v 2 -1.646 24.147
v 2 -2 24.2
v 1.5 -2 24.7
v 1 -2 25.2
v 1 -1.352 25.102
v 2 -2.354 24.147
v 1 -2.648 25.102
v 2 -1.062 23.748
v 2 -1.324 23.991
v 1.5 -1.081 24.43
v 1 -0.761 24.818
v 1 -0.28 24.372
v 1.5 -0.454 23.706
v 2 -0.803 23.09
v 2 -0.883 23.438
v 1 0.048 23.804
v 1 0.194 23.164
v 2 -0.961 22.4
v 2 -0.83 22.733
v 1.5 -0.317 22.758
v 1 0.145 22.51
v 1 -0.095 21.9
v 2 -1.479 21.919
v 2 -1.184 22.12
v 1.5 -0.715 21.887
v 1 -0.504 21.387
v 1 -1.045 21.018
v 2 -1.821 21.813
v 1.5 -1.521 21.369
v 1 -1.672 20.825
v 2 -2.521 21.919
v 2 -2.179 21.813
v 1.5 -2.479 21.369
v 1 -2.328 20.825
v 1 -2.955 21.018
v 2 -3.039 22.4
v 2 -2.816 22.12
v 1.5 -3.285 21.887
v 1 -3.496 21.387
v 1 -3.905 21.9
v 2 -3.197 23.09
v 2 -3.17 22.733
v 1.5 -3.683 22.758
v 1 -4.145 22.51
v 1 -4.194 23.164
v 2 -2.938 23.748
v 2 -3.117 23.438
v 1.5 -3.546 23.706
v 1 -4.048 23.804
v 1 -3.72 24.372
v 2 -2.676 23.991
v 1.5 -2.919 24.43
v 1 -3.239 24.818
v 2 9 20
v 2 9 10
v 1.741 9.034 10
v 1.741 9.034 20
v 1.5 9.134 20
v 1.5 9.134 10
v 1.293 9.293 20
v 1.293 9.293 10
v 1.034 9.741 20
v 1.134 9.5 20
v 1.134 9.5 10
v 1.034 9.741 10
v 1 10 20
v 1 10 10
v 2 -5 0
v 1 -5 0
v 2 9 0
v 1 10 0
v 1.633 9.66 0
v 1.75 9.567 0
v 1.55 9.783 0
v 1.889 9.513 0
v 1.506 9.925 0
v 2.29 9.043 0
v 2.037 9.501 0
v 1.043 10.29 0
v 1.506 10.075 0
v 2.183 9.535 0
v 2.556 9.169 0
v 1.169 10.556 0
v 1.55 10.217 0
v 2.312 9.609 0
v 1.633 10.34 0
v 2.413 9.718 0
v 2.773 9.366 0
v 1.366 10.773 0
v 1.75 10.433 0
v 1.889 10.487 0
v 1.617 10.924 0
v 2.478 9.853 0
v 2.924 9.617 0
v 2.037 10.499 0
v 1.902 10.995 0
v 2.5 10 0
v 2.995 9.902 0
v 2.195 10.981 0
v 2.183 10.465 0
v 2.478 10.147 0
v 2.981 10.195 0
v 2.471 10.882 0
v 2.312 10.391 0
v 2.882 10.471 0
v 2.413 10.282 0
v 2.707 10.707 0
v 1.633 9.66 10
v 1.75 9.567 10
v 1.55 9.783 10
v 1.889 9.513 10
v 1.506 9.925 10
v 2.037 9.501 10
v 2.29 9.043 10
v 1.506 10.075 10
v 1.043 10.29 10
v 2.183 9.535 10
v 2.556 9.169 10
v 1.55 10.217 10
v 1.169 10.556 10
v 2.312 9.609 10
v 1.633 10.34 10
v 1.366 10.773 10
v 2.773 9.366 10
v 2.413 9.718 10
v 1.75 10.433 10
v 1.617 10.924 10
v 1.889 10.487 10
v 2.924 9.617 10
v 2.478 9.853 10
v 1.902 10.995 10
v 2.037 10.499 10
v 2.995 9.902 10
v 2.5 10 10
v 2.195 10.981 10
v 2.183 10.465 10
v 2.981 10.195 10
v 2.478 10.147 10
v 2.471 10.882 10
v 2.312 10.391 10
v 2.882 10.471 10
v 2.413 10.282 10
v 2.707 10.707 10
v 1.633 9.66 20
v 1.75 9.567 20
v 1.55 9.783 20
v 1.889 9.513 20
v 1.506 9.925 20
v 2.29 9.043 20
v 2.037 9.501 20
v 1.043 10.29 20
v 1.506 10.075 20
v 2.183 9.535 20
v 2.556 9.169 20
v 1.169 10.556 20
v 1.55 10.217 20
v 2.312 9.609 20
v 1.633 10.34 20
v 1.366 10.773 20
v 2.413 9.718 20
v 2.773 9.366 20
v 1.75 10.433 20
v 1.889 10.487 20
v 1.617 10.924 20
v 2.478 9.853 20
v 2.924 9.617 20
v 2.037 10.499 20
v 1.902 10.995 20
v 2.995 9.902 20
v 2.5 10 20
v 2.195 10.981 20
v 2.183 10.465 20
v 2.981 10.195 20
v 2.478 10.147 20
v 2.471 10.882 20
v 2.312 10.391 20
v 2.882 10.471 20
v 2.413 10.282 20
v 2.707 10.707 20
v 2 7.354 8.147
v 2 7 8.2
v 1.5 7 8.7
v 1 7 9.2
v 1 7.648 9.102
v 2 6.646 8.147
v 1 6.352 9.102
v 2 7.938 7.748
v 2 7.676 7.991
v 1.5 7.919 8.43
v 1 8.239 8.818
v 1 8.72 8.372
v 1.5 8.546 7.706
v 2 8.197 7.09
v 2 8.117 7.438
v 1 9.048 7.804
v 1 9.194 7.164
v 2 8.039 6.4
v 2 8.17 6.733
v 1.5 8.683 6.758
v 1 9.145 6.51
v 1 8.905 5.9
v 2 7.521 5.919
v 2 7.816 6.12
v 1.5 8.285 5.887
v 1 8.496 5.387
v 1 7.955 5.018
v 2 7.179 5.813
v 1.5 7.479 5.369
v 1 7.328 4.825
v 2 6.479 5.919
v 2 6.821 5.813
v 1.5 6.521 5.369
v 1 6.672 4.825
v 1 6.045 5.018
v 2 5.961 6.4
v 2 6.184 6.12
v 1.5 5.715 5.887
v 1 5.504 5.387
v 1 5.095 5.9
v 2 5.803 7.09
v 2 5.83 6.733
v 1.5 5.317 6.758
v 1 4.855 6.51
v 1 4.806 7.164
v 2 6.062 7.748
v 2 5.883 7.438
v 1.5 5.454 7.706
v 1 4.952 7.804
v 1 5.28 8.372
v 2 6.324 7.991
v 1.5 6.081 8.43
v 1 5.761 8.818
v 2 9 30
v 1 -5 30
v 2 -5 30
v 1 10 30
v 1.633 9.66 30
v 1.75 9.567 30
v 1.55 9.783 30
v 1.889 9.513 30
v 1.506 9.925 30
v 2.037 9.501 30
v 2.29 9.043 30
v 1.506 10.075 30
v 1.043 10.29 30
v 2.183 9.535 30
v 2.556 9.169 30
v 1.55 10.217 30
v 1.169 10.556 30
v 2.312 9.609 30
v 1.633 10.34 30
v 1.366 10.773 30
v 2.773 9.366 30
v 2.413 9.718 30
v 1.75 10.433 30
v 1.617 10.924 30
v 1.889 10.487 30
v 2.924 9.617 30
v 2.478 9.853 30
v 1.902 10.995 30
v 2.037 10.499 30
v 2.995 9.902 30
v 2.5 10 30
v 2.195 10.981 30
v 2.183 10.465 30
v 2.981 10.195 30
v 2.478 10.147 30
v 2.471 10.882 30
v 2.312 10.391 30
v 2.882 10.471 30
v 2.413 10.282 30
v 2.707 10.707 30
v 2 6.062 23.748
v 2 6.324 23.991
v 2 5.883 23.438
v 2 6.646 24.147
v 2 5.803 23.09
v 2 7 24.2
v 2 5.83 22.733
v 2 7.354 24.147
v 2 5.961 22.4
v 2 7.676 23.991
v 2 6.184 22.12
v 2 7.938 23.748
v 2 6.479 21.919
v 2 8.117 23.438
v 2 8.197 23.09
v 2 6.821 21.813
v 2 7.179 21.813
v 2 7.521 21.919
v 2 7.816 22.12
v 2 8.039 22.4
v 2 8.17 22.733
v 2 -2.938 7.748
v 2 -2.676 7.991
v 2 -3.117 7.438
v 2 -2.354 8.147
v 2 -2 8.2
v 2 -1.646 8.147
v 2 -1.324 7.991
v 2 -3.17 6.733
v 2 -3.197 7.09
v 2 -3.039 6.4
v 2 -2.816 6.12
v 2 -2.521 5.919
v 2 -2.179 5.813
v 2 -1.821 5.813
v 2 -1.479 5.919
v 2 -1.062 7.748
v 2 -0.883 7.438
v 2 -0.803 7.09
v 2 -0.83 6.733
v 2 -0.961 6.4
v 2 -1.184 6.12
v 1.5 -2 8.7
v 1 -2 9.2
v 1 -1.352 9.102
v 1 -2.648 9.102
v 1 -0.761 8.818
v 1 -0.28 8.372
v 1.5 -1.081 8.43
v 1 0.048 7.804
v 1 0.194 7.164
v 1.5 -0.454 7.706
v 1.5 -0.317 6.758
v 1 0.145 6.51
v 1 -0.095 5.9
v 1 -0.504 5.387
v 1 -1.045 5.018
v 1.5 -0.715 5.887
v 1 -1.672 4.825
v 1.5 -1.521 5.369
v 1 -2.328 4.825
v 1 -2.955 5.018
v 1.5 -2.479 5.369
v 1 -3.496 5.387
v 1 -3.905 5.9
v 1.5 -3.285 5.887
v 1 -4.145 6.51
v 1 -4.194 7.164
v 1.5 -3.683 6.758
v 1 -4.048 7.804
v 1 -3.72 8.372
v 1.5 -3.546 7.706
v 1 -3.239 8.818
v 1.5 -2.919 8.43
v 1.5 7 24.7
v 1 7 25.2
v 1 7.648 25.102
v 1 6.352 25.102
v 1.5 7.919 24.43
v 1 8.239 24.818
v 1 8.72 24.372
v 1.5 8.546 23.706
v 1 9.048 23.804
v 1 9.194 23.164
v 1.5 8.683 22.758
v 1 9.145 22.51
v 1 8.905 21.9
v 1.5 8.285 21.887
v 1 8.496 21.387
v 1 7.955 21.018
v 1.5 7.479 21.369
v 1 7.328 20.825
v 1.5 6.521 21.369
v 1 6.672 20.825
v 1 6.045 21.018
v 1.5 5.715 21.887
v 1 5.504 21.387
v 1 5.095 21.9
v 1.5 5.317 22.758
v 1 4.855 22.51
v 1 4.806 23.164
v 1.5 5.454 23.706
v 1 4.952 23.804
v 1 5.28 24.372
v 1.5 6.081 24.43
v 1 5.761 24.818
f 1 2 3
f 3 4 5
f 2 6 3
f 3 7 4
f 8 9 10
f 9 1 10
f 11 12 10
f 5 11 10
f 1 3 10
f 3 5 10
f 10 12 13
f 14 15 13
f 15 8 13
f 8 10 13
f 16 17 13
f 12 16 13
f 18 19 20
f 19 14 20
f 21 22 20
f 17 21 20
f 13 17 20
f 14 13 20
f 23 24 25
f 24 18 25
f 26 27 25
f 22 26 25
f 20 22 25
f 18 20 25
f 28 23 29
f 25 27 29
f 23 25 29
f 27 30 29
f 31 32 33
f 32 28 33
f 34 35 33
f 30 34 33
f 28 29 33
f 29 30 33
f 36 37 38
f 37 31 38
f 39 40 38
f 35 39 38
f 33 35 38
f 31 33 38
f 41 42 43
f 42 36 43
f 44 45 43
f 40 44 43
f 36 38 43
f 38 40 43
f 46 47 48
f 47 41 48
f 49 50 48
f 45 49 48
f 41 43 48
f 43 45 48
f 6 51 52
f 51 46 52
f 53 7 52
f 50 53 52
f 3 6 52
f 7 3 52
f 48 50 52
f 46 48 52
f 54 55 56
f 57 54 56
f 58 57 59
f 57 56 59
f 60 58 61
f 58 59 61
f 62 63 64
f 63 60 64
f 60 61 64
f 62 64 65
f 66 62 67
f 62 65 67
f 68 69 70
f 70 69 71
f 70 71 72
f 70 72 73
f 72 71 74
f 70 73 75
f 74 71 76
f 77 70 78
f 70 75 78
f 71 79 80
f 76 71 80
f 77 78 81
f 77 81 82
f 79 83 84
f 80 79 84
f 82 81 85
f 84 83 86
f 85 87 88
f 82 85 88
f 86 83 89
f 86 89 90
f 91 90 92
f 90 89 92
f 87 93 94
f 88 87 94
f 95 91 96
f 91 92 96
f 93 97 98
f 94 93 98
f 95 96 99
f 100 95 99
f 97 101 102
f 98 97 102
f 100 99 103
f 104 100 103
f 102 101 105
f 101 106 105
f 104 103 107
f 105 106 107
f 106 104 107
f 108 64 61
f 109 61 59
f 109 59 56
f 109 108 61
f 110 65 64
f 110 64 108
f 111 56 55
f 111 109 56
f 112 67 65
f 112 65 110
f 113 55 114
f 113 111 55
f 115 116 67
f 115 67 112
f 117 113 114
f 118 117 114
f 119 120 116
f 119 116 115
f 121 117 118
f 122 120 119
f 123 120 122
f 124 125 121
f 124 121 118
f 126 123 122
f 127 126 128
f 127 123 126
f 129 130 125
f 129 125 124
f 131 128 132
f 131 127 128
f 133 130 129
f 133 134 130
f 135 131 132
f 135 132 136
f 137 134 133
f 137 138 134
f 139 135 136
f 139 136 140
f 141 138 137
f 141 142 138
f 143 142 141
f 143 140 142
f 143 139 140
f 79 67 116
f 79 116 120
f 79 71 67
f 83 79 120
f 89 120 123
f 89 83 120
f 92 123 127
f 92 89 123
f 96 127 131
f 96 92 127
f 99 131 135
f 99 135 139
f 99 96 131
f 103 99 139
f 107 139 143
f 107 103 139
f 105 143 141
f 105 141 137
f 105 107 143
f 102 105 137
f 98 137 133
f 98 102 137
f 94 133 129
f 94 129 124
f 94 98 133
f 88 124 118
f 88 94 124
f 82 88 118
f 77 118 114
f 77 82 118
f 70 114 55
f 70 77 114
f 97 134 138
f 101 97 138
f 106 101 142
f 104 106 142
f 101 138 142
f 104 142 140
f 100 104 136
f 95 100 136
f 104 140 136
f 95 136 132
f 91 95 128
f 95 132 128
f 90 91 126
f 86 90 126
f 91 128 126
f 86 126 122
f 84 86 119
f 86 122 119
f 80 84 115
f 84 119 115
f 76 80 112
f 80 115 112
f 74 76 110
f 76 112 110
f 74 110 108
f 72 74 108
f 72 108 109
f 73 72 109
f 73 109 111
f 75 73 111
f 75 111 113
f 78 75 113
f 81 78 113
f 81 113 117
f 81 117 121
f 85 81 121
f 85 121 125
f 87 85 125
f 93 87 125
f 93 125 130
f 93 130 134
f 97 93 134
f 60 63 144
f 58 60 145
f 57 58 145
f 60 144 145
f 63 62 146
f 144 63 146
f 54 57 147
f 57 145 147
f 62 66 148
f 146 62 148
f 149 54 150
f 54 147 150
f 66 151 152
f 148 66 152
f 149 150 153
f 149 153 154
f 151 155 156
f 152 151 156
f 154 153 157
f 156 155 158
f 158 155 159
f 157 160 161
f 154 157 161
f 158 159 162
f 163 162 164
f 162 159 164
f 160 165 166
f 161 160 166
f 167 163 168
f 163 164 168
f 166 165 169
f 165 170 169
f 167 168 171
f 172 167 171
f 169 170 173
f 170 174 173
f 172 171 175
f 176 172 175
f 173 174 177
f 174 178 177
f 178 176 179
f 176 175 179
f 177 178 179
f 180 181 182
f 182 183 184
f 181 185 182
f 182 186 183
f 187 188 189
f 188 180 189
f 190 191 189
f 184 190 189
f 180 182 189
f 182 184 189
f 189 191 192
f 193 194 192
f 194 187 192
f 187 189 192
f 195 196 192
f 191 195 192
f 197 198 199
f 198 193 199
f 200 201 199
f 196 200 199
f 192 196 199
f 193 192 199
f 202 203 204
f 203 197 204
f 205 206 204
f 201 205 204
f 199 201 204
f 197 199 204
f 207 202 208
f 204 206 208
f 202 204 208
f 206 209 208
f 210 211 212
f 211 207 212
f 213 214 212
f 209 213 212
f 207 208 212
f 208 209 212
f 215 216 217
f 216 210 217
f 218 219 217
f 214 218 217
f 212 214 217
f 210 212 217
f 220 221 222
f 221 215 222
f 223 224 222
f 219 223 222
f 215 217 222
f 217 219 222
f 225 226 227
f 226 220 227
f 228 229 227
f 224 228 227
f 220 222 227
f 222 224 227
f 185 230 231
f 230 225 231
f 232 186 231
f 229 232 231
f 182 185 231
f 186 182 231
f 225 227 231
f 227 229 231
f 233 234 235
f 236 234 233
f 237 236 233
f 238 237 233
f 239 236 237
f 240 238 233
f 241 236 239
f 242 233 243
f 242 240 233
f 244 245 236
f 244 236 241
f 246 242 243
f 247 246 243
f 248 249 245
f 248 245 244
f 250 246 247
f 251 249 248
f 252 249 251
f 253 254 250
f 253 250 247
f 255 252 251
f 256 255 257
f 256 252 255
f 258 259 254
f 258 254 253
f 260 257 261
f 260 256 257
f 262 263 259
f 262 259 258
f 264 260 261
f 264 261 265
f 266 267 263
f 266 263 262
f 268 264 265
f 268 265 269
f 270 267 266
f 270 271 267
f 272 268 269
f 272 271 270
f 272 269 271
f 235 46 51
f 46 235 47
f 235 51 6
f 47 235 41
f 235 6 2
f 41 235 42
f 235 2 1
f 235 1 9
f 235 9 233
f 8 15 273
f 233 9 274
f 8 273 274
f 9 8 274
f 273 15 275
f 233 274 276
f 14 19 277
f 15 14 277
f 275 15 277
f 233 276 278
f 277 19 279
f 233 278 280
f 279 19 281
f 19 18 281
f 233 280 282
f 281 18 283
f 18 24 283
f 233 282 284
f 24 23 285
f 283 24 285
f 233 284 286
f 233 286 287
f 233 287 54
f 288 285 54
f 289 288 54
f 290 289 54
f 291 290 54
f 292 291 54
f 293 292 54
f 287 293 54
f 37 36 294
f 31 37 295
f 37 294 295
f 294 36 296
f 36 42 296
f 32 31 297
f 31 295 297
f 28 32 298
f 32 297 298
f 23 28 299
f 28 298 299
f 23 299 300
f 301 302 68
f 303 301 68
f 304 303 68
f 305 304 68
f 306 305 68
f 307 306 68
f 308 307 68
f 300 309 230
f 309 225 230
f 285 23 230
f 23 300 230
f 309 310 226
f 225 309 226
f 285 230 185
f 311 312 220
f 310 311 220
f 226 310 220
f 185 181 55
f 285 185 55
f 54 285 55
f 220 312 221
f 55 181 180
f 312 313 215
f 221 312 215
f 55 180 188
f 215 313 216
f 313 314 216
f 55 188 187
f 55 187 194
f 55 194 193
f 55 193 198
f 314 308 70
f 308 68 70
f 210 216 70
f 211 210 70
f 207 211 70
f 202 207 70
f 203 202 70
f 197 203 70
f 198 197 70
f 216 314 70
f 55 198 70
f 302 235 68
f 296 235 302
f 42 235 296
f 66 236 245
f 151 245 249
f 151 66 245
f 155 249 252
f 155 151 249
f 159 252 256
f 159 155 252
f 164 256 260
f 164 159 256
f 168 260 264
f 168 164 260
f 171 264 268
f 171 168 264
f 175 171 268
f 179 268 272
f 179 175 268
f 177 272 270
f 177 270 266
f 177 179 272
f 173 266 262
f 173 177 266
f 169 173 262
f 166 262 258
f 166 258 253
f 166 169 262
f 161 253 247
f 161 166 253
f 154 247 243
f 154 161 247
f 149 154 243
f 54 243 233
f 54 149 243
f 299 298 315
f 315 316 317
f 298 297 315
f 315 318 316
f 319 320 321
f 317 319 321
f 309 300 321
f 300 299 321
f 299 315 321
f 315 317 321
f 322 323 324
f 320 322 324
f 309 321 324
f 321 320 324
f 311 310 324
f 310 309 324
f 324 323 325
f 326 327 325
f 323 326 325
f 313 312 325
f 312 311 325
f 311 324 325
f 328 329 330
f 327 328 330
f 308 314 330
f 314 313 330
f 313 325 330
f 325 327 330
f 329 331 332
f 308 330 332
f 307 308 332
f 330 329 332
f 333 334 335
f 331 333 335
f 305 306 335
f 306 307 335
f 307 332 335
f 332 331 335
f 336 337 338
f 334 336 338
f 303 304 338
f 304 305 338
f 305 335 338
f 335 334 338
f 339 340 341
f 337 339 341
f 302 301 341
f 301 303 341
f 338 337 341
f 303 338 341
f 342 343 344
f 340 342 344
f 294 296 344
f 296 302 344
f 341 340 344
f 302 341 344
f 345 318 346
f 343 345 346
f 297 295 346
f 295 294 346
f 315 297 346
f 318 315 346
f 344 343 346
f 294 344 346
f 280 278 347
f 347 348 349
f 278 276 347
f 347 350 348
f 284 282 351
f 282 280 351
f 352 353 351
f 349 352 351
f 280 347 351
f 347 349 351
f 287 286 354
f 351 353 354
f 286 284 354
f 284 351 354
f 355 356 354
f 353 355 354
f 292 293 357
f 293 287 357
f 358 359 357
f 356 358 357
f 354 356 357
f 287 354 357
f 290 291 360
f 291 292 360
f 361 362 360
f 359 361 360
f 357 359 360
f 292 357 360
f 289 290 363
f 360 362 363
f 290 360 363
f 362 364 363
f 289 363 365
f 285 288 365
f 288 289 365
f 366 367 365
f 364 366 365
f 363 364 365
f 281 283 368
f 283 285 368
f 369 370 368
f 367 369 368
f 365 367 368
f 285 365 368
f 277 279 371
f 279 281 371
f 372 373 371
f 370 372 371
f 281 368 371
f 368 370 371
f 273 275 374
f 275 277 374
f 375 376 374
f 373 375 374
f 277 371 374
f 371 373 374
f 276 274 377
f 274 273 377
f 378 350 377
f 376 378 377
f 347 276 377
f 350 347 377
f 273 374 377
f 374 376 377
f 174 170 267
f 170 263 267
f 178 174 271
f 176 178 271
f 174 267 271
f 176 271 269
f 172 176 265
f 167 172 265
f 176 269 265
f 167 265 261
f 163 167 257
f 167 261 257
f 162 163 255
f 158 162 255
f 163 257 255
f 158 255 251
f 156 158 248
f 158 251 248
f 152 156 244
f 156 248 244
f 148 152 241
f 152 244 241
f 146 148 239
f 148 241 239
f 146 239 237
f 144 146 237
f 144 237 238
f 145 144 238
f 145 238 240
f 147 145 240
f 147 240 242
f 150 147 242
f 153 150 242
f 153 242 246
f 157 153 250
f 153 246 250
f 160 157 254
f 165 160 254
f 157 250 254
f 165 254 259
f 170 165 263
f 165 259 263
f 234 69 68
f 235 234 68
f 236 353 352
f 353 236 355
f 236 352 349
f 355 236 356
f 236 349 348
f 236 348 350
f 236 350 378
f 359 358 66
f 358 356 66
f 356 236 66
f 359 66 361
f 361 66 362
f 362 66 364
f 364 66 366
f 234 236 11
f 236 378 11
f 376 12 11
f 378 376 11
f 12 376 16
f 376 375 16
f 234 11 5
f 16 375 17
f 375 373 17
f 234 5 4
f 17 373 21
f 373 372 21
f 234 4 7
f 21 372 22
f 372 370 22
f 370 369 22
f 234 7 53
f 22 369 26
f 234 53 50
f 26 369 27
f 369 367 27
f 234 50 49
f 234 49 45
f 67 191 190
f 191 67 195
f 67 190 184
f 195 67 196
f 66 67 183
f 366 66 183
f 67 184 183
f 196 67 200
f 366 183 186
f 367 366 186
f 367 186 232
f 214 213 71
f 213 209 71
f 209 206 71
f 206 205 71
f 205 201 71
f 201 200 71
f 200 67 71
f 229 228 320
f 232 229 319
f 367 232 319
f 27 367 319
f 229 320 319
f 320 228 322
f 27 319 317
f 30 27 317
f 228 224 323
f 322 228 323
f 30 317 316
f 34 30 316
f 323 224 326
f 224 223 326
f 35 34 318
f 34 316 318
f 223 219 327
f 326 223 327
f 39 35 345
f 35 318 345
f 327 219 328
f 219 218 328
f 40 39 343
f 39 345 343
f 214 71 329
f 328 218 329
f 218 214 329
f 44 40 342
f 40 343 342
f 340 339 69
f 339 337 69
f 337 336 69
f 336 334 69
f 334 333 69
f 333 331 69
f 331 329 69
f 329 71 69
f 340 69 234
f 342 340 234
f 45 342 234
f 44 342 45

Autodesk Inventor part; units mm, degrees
ref_plane "YZ Plane" through (0, 0, 0) normal (1, 0, 0) x (0, 1, 0)
ref_plane "XZ Plane" through (0, 0, 0) normal (0, 1, 0) x (-1, 0, 0)
ref_plane "XY Plane" through (0, 0, 0) normal (0, 0, 1) x (1, 0, 0)
sketch "Szkic1" plane through (0, 0, 0) normal (0, 0, 1) x (1, 0, 0)
  line L0 (2, 10) -> (1, 10)
  line L1 (1, 10) -> (1, -5)
  line L2 (1, -5) -> (2, -5)
  line L3 (2, -5) -> (2, 10)
  circle A0 centre (2, 10) radius 1
  point P0 (0, 0)
  point P1 (0, 0)
  point P2 (2, 9)
  point P3 (2, 9)
extrude "Wyciągnięcie proste1" add sketch "Szkic1" along normal blind 30
ref_plane "Płaszczyzna konstrukcyjna1" through (0, 0, 10) normal (0, 0, 1) x (1, 0, 0)
sketch "Szkic2" plane through (0, 0, 10) normal (0, 0, 1) x (1, 0, 0)
  arc A0 (2, 9) -> (1, 10) centre (2, 10) ccw projected
  circle A1 centre (2, 10) radius 1
  point P0 (0, 0)
extrude "Wyciągnięcie proste2" cut sketch "Szkic2" along normal blind 10
sketch "Szkic3" plane through (0, 0, 30) normal (0, 0, 1) x (1, 0, 0)
  circle A0 centre (2, 10) radius 0.5
  point P0 (0, 0)
  dimension "d5" = 1
extrude "Wyciągnięcie proste3" cut sketch "Szkic3" against normal blind 30
sketch "Szkic8" plane through (1, -5, 0) normal (-1, 0, 0) x (0, 0, 1)
  point P0 (7, 3)
hole "Otwór5" at (1, -2, 7) direction (1, 0, 0) diameter 2.4 end through all countersink diameter 4.4 countersink angle 90
sketch "Szkic9" plane through (1, -5, 0) normal (-1, 0, 0) x (0, 0, 1)
  point P0 (7, 12)
hole "Otwór6" at (1, 7, 7) direction (1, 0, 0) diameter 2.4 end through all countersink diameter 4.4 countersink angle 90
sketch "Szkic10" plane through (1, -5, 0) normal (-1, 0, 0) x (0, 0, 1)
  point P0 (23, 12)
hole "Otwór7" at (1, 7, 23) direction (1, 0, 0) diameter 2.4 end through all countersink diameter 4.4 countersink angle 90
sketch "Szkic11" plane through (1, -5, 0) normal (-1, 0, 0) x (0, 0, 1)
  point P0 (23, 3)
hole "Otwór8" at (1, -2, 23) direction (1, 0, 0) diameter 2.4 end through all countersink diameter 4.4 countersink angle 90
properties part number "hinge 2"
